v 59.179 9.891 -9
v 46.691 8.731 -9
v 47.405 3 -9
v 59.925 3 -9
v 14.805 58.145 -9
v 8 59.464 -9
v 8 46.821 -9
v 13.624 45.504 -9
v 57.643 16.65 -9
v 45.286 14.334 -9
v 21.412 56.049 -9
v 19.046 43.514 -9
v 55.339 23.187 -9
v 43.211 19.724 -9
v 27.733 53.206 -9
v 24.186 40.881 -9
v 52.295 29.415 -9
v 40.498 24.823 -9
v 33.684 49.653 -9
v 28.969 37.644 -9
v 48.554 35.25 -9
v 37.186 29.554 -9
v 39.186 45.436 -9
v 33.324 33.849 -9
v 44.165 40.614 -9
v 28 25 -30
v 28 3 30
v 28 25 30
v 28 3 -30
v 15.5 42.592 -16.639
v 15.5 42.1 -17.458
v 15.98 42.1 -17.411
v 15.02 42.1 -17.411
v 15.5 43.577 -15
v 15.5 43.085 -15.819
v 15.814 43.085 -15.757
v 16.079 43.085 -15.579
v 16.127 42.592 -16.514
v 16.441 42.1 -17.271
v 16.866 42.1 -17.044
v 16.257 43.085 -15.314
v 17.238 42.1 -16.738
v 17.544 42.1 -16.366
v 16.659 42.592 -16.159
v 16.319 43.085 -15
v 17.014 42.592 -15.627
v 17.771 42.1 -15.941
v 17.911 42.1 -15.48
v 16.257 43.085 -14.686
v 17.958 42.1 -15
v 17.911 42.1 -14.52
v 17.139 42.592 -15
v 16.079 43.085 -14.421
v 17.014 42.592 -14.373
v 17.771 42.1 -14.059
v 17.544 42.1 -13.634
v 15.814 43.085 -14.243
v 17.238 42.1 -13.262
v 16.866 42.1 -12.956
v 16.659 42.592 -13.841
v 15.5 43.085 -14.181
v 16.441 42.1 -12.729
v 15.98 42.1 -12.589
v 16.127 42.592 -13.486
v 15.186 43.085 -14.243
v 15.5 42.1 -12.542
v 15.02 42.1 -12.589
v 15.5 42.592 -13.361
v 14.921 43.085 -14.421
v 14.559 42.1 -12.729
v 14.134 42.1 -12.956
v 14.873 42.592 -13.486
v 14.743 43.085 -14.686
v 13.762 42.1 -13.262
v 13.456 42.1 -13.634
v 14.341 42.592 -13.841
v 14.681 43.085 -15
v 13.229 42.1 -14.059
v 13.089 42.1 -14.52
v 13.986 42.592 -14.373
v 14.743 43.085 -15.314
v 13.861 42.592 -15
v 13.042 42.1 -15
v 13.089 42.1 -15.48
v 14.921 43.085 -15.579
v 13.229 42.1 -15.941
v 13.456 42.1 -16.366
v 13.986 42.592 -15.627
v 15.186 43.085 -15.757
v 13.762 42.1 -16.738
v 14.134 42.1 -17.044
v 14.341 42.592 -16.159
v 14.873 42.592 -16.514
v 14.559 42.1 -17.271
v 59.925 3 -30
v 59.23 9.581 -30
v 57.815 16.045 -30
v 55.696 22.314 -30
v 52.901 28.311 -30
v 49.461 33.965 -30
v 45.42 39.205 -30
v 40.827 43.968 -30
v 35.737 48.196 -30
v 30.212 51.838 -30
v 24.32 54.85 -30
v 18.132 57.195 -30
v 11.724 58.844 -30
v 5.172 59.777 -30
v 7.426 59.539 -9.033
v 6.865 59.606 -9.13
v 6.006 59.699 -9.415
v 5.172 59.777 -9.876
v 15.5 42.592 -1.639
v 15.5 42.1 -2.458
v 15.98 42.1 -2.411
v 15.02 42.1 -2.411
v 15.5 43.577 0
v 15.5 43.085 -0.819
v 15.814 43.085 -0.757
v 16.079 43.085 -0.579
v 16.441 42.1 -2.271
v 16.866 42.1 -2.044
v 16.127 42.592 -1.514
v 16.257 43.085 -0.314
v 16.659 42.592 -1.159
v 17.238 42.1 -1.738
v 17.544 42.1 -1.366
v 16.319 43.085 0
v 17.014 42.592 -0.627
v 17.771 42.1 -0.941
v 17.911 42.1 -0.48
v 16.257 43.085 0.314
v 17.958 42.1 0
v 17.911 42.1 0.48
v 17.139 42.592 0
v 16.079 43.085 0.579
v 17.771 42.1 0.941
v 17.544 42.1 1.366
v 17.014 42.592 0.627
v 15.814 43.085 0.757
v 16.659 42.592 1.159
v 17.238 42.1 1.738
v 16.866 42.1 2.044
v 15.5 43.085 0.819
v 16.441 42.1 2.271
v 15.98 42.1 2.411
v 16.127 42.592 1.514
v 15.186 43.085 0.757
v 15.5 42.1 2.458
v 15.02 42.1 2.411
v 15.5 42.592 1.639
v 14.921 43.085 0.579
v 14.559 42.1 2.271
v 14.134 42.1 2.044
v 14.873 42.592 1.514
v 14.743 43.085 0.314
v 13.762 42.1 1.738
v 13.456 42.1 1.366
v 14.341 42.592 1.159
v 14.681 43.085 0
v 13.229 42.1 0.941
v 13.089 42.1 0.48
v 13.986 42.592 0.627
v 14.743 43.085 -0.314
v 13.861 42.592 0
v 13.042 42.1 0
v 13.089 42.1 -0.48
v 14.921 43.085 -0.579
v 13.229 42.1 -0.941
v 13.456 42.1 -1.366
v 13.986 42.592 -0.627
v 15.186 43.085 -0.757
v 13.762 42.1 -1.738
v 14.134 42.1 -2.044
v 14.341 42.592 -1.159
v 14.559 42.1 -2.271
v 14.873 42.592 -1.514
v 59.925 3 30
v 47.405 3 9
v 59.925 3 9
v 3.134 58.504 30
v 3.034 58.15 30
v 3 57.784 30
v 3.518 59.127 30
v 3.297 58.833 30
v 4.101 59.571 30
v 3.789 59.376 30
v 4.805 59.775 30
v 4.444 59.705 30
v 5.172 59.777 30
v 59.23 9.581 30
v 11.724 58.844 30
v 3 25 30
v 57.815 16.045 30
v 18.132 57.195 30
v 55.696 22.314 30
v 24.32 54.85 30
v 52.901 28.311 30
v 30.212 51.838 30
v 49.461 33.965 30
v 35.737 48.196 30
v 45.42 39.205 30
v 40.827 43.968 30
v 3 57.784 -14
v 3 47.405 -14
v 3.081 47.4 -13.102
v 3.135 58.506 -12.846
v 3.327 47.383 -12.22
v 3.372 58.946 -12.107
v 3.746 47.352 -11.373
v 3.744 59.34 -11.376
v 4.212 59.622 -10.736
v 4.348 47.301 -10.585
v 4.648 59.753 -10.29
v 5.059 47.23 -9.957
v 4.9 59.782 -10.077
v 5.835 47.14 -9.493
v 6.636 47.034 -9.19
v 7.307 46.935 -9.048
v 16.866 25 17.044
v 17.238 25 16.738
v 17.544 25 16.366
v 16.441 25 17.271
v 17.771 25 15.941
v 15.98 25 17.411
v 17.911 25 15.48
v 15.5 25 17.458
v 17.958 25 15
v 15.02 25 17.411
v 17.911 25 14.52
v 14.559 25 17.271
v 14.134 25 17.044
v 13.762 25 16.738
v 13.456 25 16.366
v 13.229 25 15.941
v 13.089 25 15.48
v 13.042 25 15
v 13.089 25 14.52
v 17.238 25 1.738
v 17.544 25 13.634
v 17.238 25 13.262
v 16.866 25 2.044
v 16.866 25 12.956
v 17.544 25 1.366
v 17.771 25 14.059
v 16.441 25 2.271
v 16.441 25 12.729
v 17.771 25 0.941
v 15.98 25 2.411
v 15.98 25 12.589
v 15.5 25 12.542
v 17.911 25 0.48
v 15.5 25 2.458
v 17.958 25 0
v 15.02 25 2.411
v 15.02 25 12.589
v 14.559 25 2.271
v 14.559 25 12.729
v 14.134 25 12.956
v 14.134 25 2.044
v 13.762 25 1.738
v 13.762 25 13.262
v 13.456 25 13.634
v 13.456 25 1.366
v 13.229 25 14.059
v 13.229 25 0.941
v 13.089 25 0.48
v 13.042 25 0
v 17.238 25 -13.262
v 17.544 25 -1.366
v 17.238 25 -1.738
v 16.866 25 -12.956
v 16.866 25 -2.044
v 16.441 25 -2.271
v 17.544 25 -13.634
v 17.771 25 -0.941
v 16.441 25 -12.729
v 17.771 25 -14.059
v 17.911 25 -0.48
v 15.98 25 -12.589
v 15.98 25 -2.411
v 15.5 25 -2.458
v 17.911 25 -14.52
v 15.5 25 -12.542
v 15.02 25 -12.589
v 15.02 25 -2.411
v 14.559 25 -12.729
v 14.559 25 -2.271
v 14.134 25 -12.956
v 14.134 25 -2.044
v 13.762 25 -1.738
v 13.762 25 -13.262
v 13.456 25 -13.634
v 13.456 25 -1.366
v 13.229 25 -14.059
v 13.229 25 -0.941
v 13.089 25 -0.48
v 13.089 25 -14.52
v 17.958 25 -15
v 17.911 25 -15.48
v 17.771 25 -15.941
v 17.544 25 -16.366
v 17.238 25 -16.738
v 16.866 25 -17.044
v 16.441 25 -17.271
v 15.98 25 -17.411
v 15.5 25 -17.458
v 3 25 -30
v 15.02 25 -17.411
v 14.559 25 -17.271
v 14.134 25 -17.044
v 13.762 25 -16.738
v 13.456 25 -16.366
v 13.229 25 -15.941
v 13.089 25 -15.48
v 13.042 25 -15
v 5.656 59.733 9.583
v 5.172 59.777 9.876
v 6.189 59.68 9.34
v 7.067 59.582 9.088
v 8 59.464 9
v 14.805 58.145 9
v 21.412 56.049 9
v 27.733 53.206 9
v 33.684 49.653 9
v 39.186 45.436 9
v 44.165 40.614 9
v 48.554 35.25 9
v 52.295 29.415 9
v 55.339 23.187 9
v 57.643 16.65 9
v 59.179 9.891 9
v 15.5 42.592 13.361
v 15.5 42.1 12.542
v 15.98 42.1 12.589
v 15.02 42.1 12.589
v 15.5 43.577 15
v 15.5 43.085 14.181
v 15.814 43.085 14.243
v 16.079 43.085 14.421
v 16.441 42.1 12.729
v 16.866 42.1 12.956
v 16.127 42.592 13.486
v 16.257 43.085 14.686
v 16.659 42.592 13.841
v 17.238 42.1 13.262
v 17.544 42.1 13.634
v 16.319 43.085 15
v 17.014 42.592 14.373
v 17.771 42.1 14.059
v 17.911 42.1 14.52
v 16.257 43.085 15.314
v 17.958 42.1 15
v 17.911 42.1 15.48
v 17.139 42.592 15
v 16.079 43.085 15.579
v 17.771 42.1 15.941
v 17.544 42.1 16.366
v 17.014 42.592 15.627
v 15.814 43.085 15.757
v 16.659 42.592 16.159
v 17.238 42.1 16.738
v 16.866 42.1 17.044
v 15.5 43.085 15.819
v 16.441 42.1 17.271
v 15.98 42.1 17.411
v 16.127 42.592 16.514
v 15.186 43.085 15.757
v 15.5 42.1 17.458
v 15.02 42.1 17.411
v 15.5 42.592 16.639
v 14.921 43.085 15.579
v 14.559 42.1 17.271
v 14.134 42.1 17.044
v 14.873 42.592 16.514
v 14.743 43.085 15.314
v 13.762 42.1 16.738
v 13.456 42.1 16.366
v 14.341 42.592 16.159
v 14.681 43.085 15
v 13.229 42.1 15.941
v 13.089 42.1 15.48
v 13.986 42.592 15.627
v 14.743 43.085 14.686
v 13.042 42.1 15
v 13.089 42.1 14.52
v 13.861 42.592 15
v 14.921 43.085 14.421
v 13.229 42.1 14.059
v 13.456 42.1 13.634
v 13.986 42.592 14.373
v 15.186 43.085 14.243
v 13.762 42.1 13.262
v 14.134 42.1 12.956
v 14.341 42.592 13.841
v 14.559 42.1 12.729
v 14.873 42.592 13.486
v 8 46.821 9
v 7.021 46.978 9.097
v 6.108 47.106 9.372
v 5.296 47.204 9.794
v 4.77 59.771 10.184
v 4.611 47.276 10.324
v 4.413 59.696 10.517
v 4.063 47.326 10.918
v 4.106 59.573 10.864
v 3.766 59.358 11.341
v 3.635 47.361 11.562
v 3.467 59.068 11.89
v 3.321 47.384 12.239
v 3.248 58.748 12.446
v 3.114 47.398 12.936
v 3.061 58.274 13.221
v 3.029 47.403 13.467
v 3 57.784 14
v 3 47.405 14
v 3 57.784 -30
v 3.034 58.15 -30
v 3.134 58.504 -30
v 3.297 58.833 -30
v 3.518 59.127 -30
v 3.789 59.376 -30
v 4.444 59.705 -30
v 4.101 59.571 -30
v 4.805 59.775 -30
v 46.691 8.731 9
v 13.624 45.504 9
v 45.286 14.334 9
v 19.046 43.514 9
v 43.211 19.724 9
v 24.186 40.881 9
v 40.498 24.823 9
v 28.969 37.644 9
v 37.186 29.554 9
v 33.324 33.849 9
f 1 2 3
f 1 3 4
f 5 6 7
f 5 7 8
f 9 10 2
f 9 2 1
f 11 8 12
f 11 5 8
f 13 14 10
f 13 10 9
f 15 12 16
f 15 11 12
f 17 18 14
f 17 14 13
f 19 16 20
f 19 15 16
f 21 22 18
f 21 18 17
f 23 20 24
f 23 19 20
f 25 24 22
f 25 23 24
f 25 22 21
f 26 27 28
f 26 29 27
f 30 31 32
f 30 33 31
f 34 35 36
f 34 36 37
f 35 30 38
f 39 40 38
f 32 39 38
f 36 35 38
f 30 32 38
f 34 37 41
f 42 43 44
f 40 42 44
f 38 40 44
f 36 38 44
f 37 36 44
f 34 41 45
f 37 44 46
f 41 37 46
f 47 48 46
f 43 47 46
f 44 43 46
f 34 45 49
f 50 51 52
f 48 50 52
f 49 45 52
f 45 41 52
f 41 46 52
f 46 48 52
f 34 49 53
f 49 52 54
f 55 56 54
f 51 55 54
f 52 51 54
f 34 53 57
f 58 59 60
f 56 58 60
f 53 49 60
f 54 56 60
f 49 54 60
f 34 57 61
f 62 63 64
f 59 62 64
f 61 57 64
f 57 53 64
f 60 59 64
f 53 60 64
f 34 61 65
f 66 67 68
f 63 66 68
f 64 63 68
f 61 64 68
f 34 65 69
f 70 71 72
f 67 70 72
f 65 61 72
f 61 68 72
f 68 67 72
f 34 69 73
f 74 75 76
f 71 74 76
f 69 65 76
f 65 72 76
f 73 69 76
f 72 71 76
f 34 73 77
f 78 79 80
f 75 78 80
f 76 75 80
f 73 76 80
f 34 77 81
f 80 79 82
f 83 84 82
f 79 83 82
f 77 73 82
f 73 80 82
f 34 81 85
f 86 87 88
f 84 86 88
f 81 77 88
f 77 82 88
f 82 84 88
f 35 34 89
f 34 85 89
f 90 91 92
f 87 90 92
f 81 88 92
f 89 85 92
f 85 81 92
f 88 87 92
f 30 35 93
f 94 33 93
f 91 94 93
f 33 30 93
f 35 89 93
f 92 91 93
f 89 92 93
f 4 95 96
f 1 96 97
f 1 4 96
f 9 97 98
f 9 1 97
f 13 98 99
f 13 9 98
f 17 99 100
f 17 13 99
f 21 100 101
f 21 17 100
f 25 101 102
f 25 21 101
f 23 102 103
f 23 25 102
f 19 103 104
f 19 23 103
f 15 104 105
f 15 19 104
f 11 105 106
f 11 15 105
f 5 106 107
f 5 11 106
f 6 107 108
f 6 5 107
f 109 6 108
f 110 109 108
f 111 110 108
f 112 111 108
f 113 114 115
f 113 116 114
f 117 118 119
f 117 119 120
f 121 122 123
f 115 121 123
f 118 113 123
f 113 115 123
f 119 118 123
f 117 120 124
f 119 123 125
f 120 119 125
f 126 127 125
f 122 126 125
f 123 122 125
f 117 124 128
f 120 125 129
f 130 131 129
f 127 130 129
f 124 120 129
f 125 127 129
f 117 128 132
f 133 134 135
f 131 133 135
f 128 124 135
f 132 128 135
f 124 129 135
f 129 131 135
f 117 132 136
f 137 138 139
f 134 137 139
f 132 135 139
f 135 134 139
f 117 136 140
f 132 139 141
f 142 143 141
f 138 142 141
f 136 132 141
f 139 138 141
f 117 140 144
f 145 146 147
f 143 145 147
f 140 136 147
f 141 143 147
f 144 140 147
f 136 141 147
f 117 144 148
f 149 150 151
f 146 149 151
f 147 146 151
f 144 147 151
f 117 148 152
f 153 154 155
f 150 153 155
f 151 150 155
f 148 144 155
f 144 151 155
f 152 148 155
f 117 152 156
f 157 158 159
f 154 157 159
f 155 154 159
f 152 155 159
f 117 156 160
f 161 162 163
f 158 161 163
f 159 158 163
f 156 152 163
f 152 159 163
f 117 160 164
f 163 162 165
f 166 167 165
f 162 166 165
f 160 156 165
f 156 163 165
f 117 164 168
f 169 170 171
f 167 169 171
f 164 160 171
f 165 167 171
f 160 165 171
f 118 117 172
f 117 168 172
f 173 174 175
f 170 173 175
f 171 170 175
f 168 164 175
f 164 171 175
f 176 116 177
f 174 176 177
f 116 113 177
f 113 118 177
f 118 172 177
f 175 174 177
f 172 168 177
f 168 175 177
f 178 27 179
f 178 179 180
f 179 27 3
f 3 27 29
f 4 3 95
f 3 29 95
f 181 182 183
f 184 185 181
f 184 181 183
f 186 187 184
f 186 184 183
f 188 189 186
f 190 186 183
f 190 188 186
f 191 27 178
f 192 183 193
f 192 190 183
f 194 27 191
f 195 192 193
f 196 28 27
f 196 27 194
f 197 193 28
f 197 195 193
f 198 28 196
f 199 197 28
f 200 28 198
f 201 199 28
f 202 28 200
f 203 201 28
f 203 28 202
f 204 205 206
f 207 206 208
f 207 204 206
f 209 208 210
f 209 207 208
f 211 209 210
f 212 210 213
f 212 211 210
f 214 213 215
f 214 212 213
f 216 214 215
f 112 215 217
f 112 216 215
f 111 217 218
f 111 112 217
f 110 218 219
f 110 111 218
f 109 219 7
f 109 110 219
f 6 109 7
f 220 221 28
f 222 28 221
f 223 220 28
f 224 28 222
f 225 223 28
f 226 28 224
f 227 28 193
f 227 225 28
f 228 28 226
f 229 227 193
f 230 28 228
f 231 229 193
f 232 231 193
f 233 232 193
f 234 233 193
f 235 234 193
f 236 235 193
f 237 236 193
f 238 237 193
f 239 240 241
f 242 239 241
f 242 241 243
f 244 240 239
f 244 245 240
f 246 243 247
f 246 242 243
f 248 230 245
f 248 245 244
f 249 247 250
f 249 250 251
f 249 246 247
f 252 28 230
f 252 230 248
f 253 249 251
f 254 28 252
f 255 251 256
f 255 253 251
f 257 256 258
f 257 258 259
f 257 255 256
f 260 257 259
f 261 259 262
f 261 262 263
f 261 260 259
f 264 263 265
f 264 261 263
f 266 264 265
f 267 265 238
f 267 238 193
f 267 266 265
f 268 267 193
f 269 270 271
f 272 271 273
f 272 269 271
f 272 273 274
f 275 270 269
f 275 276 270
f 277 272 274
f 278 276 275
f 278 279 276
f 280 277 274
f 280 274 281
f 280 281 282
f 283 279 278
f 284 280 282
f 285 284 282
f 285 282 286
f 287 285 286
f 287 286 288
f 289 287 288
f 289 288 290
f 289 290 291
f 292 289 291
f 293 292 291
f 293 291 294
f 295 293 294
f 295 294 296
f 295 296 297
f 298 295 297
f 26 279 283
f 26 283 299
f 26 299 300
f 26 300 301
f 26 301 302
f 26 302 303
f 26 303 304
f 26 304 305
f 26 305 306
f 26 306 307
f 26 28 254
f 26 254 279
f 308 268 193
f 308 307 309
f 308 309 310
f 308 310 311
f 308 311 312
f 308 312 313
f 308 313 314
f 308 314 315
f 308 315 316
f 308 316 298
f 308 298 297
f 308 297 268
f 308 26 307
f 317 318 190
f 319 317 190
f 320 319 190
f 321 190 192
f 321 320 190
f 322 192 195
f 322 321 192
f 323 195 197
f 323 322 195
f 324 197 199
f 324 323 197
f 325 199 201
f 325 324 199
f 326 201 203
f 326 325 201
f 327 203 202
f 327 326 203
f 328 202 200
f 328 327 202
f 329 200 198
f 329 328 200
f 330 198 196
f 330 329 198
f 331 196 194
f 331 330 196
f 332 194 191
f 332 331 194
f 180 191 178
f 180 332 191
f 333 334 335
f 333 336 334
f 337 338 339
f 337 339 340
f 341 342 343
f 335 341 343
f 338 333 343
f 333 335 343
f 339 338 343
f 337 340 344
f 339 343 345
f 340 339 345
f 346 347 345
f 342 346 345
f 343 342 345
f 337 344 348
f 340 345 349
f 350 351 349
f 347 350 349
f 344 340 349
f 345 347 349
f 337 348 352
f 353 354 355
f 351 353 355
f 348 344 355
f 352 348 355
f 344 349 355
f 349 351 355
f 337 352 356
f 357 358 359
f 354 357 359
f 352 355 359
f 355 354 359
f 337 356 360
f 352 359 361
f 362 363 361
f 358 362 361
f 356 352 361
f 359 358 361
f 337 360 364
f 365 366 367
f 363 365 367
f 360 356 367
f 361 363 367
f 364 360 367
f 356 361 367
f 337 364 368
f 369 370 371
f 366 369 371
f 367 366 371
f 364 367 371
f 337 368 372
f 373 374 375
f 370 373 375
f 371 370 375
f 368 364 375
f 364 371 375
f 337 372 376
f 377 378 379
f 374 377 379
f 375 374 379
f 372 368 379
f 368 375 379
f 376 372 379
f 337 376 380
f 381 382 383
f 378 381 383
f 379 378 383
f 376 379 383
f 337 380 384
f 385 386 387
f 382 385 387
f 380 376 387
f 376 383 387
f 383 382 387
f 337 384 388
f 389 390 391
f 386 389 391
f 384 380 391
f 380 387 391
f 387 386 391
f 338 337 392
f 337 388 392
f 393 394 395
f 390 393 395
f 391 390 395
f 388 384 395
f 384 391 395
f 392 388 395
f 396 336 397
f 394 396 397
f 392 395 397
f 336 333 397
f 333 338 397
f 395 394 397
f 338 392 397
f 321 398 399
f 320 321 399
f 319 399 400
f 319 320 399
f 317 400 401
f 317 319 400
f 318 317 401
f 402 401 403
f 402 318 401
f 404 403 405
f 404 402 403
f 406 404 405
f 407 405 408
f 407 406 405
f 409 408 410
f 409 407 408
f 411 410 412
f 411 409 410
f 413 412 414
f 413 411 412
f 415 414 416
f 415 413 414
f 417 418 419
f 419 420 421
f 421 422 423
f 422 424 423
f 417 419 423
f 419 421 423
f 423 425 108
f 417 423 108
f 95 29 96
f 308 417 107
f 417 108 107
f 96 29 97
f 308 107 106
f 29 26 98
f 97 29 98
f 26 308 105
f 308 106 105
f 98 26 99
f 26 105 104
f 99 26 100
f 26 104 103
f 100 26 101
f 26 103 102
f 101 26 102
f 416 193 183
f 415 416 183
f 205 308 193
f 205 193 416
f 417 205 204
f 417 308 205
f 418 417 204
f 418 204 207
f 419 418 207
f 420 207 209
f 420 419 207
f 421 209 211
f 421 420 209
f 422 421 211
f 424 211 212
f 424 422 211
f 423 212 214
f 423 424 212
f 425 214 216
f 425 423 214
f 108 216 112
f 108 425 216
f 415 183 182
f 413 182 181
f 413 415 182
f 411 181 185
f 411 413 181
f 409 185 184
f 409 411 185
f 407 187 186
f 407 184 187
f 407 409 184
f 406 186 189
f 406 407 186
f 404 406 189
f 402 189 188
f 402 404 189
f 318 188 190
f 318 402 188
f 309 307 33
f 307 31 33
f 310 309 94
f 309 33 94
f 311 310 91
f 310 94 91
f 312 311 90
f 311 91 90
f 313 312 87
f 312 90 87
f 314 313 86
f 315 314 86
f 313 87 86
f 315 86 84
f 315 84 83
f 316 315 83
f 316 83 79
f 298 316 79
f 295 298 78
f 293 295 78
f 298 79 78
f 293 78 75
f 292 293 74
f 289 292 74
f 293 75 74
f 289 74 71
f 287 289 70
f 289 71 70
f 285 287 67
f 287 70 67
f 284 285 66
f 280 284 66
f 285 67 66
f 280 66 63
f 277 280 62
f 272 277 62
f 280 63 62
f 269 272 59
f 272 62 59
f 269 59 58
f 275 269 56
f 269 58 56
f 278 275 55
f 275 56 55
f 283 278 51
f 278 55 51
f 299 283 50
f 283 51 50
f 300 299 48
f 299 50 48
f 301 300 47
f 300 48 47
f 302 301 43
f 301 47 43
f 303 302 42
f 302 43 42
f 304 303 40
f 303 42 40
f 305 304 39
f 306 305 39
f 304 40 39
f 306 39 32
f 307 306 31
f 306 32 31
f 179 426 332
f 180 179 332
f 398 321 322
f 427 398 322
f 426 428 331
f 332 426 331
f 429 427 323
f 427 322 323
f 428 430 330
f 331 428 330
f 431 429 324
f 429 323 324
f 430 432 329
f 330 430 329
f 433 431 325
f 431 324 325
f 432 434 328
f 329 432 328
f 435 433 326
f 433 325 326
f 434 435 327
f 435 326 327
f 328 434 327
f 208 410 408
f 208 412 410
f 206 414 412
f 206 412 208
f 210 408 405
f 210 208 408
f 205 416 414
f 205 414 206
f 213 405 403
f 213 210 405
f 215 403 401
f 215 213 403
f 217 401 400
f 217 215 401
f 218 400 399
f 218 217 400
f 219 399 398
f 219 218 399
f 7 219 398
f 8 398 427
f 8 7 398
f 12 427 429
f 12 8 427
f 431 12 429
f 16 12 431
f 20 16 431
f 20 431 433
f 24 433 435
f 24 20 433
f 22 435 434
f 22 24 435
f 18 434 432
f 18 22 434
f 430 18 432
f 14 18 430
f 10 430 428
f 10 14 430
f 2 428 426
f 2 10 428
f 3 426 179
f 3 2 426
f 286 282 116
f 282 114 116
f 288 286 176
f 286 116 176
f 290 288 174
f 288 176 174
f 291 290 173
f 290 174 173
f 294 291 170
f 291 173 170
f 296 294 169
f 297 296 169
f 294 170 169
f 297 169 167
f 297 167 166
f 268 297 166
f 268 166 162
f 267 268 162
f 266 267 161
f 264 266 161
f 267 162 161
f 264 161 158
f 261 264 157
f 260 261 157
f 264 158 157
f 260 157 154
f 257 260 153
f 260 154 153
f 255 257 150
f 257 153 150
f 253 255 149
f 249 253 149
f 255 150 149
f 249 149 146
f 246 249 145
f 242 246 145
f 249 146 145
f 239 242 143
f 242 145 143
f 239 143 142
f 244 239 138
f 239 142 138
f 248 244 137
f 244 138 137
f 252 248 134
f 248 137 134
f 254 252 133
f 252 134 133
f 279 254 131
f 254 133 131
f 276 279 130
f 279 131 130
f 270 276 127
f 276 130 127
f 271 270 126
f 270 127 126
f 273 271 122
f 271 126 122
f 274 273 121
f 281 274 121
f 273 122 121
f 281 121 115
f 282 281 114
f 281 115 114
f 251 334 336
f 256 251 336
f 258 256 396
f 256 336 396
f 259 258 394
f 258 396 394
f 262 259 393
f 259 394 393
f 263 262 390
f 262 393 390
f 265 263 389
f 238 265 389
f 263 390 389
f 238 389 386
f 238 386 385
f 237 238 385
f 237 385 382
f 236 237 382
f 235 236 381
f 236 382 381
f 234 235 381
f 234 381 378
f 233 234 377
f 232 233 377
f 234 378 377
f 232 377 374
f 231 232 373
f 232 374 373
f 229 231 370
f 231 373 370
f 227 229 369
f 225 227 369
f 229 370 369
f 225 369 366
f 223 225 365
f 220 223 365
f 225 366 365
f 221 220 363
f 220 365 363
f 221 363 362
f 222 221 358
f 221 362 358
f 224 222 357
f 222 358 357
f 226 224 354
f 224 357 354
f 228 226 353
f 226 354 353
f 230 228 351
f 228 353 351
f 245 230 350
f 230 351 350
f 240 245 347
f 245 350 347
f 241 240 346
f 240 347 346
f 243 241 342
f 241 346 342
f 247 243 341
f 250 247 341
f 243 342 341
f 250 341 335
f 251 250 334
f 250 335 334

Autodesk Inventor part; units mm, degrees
ref_plane "YZ Plane" through (0, 0, 0) normal (1, 0, 0) x (0, 1, 0)
ref_plane "XZ Plane" through (0, 0, 0) normal (0, 1, 0) x (-1, 0, 0)
sketch "Sketch15" plane through (0, 0, 0) normal (0, 0, 1) x (1, 0, 0)
  circle A0 centre (0, 0) radius 60
  dimension "d88" = 120
extrude "Extrusion7" add sketch "Sketch15" along normal mid plane 60
ref_plane "Work Plane1" through (0, 0, 0) normal (0, 0, 1) x (1, 0, 0)
sketch "Sketch16" plane through (0, 0, 0) normal (0, 0, 1) x (1, 0, 0)
  circle A0 centre (0, 0) radius 60 projected
  circle A1 centre (0, 0) radius 47.5
  dimension "d117" = 95
extrude "Extrusion8" cut sketch "Sketch16" along normal mid plane 18
sketch "Sketch17" plane through (0, 0, 0) normal (0, 0, 1) x (1, 0, 0)
  circle A0 centre (0, 0) radius 60 projected
  line L0 (3, 3) -> (59.925, 3)
  line L1 (3, 3) -> (3, 59.925)
  line L2 (28, 25) -> (0, 25)
  line L3 (0, 25) -> (0, 0)
  line L4 (0, 0) -> (28, 0)
  line L5 (28, 0) -> (28, 25)
  point P0 (28, 3)
  point P1 (3, 25)
  dimension "d118" = 3
  dimension "d119" = 3
  dimension "d120" = 22
  dimension "d121" = 25
extrude "Extrusion9" cut sketch "Sketch17" along normal through all both and the other way through all contours A0 L1 L2 L3 L4 L5 L0 | L5 L4 L3 L2 L1 L0 | L0 L1 L2 L5
sketch "Sketch19" plane through (3, 25, 30) normal (0, -1, 0) x (1, 0, 0)
  line L0 (0, -60) -> (0, 0) projected
  point P0 (-3, -30)
  point P1 (12.5, -15)
  point P2 (12.5, -45)
  point P3 (0, -30)
  point P4 (12.5, -30)
  point P5 (0, -30)
  dimension "d122" = 30
  dimension "d123" = 15
  dimension "d124" = 12.5
hole "Hole6" at (15.5, 25, 15) at (15.5, 25, -15) at (15.5, 25, 0) direction (0, 1, 0) diameter 4.917 depth 17.1 tip angle 118 thread size "M6x1" class "6H" standard "TS profile"
fillet "Fillet4" radius 2 2 edges at (3, 59.925, -19.5) (3, 59.925, 19.5)
fillet "Fillet5" radius 5 2 edges at (3, 52.5946, -9) (3, 52.5946, 9)
equation "\"d123\" = 0.5 * d122"
properties part number "TL20240701-10110CV-029" material "S45C"
